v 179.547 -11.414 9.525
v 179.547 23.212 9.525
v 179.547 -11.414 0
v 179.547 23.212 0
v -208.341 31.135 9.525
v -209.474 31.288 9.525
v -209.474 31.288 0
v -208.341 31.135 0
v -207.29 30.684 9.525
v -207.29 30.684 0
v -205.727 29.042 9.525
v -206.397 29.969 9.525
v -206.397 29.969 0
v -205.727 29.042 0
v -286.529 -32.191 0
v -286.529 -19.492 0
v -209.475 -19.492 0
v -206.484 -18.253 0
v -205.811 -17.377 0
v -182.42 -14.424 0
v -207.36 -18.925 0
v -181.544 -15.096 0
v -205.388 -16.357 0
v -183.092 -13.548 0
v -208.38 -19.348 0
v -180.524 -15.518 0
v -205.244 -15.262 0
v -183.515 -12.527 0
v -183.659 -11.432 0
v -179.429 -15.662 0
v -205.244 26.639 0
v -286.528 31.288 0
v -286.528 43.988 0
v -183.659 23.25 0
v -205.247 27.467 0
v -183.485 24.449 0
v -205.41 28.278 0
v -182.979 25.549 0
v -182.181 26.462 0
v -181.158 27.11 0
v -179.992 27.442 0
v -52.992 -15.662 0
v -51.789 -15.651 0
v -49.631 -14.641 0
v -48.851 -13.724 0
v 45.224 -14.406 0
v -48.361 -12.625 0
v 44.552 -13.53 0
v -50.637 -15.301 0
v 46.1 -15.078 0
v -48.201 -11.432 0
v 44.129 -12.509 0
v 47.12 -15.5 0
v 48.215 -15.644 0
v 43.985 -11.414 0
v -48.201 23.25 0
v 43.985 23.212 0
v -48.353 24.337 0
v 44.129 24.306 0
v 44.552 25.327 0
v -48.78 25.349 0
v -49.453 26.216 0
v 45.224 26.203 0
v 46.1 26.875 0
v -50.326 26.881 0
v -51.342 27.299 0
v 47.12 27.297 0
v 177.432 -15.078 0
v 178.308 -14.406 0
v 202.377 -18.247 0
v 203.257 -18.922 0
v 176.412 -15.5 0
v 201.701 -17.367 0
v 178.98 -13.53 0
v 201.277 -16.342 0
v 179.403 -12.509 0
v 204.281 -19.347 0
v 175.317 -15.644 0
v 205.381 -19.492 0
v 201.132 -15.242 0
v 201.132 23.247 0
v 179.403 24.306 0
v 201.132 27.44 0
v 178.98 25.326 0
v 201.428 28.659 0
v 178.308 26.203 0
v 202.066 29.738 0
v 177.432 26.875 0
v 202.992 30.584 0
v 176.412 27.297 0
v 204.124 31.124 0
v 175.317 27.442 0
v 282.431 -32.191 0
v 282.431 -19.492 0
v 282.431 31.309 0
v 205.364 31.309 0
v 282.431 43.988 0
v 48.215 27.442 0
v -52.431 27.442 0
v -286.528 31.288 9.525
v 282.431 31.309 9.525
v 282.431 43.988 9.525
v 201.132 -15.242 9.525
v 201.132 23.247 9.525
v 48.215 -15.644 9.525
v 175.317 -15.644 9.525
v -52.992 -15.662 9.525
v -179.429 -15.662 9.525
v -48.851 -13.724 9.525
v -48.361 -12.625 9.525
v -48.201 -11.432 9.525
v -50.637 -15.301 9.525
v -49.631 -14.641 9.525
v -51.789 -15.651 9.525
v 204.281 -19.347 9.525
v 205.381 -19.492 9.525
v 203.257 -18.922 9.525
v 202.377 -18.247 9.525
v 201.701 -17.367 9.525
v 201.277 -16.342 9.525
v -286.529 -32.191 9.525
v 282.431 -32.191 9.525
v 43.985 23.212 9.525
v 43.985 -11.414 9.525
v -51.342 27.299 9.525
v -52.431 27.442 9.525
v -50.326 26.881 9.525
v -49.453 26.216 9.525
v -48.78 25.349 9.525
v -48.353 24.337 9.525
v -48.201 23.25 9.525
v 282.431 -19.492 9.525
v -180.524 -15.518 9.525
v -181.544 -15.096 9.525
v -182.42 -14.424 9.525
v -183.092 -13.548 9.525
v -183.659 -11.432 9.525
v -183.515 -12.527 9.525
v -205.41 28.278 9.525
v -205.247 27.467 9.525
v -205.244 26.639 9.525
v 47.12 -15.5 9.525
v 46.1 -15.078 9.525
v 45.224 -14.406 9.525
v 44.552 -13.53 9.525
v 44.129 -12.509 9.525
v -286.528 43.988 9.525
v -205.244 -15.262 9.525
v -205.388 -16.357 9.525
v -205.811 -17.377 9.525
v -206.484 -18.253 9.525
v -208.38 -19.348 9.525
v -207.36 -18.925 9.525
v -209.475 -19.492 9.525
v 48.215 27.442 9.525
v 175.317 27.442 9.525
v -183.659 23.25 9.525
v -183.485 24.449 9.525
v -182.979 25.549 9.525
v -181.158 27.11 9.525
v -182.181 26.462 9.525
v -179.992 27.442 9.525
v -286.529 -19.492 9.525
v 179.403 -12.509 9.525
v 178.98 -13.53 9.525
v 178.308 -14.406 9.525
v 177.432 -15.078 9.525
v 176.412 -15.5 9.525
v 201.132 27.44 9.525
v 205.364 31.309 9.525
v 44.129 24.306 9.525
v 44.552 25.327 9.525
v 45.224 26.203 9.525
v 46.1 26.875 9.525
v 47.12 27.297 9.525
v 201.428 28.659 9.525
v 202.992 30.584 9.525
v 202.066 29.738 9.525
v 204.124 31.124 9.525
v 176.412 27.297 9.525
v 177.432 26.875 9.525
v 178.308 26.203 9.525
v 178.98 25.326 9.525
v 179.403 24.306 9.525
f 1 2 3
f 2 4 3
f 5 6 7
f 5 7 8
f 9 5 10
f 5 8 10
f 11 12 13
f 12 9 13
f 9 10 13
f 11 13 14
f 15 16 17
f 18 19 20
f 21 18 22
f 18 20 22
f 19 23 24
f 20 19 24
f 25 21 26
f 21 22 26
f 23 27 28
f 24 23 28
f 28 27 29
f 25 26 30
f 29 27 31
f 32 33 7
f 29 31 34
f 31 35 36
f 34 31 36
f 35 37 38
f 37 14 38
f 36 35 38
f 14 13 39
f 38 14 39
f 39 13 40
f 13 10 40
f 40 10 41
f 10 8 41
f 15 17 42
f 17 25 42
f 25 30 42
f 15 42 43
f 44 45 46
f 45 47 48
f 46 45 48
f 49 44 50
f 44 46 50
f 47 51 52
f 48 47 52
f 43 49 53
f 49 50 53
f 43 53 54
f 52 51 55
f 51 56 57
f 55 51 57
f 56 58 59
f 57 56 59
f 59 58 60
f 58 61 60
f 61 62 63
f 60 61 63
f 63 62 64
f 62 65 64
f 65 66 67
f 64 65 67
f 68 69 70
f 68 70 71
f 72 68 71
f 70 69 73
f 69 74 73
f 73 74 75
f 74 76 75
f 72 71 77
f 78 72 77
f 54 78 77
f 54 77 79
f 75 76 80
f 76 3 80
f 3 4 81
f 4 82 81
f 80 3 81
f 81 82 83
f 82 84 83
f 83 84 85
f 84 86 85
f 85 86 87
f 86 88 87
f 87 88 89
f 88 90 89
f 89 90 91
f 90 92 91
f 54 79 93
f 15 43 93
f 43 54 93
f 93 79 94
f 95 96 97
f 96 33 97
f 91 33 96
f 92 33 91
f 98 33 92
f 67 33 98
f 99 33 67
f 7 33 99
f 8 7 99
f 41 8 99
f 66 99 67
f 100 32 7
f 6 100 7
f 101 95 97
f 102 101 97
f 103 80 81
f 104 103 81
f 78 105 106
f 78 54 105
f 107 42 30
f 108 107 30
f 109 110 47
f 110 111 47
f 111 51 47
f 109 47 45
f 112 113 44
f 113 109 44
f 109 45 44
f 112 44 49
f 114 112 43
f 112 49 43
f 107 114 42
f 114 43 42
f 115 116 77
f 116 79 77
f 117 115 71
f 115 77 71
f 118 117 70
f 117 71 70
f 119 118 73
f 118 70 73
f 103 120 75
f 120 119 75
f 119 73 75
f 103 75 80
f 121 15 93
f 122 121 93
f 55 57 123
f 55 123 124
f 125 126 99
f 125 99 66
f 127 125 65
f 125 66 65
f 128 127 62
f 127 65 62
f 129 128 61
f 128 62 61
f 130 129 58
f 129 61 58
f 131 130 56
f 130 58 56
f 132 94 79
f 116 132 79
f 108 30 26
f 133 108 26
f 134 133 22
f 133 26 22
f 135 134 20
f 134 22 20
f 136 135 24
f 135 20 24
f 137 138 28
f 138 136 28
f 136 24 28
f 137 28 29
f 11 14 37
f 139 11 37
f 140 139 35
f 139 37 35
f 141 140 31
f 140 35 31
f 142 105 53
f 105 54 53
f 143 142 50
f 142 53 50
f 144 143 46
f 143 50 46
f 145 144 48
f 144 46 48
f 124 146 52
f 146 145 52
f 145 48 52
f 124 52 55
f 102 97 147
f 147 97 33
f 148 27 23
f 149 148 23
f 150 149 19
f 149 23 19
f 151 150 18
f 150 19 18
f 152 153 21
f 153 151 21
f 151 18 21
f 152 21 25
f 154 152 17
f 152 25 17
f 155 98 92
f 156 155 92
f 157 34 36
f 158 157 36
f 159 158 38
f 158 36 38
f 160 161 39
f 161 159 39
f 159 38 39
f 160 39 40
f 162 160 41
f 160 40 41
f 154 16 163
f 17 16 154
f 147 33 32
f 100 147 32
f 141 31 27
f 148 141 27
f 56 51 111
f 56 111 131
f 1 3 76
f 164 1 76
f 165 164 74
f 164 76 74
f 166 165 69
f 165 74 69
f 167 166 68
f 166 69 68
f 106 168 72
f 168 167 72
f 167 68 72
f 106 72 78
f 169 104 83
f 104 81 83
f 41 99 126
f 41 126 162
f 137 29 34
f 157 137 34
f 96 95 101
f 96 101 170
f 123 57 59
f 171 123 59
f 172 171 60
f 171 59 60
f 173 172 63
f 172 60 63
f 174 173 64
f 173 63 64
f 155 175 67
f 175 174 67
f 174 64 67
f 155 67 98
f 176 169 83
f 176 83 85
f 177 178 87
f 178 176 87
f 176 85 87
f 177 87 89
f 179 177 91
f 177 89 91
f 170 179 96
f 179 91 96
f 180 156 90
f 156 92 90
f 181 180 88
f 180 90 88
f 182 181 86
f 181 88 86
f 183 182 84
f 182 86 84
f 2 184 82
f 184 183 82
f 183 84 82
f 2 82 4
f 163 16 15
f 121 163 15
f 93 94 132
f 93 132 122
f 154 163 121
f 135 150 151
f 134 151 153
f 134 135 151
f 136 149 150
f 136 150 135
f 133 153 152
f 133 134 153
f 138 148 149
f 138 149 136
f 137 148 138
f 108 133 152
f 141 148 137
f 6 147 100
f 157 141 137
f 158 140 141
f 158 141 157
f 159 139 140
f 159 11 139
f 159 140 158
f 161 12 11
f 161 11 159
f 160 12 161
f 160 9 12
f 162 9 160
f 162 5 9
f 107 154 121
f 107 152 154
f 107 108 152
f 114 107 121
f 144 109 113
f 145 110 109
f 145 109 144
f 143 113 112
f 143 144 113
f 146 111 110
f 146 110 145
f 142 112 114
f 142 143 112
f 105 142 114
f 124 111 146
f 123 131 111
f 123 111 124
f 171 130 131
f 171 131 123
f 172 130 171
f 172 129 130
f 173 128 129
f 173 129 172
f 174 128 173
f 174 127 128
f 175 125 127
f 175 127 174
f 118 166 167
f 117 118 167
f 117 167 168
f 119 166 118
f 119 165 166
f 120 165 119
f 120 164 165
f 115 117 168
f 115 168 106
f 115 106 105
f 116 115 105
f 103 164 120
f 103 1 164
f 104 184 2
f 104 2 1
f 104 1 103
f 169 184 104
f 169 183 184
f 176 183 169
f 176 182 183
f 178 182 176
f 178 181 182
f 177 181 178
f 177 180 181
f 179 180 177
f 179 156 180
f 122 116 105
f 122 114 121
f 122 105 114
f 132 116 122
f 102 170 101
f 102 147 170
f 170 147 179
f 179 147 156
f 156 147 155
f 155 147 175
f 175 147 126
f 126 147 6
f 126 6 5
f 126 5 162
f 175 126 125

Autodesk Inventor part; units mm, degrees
ref_plane "YZ Plane" through (0, 0, 0) normal (1, 0, 0) x (0, 1, 0)
ref_plane "XZ Plane" through (0, 0, 0) normal (0, 1, 0) x (-1, 0, 0)
ref_plane "XY Plane" through (0, 0, 0) normal (0, 0, 1) x (1, 0, 0)
sketch "Sketch1" plane through (0, 0, 0) normal (0, 0, 1) x (1, 0, 0)
  line L0 (282.4312, 43.9885) -> (-286.5277, 43.9885)
  line L1 (-286.5288, -32.1915) -> (282.4312, -32.1915)
  line L2 (-286.5277, 43.9885) -> (-286.5277, 31.2885)
  line L3 (-286.5288, -19.4915) -> (-286.5288, -32.1915)
  line L4 (282.4312, 31.3086) -> (282.4312, 43.9885)
  line L5 (282.4312, -19.4915) -> (282.4312, -32.1915)
  arc A0 (-205.7269, 29.0424) -> (-209.4741, 31.2885) centre (-209.4741, 27.0395) ccw
  arc A1 (-205.2441, 26.6389) -> (-205.7269, 29.0424) centre (-209.4741, 27.0395) ccw
  arc A2 (-209.4751, -19.4915) -> (-205.2441, -15.2625) centre (-209.4741, -15.2615) ccw
  arc A3 (-179.9924, 27.4418) -> (-183.6588, 23.2495) centre (-179.4288, 23.2495) ccw
  arc A4 (-183.6588, -11.4325) -> (-179.4288, -15.6625) centre (-179.4288, -11.4325) ccw
  arc A5 (-48.2006, 23.2495) -> (-52.4306, 27.4418) centre (-52.4304, 23.2118) ccw
  arc A6 (-52.9924, -15.6625) -> (-48.2006, -11.4325) centre (-52.4304, -11.47) ccw
  line L6 (-52.4306, 27.4418) -> (-179.9924, 27.4418)
  line L7 (-52.9924, -15.6625) -> (-179.4288, -15.6625)
  line L8 (-48.2006, -11.4325) -> (-48.2006, 23.2495)
  line L9 (-183.6588, -11.4325) -> (-183.6588, 23.2495)
  arc A7 (205.3642, 31.3086) -> (201.1322, 27.4399) centre (205.3642, 27.0596) ccw
  arc A8 (201.1322, -15.2425) -> (205.3812, -19.4915) centre (205.3812, -15.2425) ccw
  line L10 (201.1322, -15.2425) -> (201.1322, 23.2474)
  line L11 (201.1322, 23.2474) -> (201.1322, 27.4399)
  line L12 (282.4312, 31.3086) -> (205.3642, 31.3086)
  line L13 (282.4312, -19.4915) -> (205.3812, -19.4915)
  line L14 (-286.5288, -19.4915) -> (-209.4751, -19.4915)
  line L15 (-286.5277, 31.2885) -> (-209.4741, 31.2885)
  line L16 (-205.2441, 26.6389) -> (-205.2441, -15.2625)
  arc A9 (48.2152, 27.4415) -> (43.9852, 23.2115) centre (48.2152, 23.2115) ccw
  arc A10 (43.9852, -11.4145) -> (48.2152, -15.6445) centre (48.2152, -11.4145) ccw
  arc A11 (179.5472, 23.2115) -> (175.3172, 27.4415) centre (175.3172, 23.2115) ccw
  arc A12 (175.3172, -15.6445) -> (179.5472, -11.4145) centre (175.3172, -11.4145) ccw
  line L17 (48.2152, 27.4415) -> (175.3172, 27.4415)
  line L18 (48.2152, -15.6445) -> (175.3172, -15.6445)
  line L19 (43.9852, 23.2115) -> (43.9852, -11.4145)
  line L20 (179.5472, 23.2115) -> (179.5472, -11.4145)
  point P0 (0, 0)
  point P1 (0, 0)
  dimension "d0" = 135.4582
  dimension "d1" = 43.1043
  dimension "d2" = 16.5467
  dimension "d3" = 16.529
  dimension "d4" = 21.5853
  dimension "d5" = 92.1858
extrude "Extrusion1" add sketch "Sketch1" along normal blind 9.525
properties part number "top"
